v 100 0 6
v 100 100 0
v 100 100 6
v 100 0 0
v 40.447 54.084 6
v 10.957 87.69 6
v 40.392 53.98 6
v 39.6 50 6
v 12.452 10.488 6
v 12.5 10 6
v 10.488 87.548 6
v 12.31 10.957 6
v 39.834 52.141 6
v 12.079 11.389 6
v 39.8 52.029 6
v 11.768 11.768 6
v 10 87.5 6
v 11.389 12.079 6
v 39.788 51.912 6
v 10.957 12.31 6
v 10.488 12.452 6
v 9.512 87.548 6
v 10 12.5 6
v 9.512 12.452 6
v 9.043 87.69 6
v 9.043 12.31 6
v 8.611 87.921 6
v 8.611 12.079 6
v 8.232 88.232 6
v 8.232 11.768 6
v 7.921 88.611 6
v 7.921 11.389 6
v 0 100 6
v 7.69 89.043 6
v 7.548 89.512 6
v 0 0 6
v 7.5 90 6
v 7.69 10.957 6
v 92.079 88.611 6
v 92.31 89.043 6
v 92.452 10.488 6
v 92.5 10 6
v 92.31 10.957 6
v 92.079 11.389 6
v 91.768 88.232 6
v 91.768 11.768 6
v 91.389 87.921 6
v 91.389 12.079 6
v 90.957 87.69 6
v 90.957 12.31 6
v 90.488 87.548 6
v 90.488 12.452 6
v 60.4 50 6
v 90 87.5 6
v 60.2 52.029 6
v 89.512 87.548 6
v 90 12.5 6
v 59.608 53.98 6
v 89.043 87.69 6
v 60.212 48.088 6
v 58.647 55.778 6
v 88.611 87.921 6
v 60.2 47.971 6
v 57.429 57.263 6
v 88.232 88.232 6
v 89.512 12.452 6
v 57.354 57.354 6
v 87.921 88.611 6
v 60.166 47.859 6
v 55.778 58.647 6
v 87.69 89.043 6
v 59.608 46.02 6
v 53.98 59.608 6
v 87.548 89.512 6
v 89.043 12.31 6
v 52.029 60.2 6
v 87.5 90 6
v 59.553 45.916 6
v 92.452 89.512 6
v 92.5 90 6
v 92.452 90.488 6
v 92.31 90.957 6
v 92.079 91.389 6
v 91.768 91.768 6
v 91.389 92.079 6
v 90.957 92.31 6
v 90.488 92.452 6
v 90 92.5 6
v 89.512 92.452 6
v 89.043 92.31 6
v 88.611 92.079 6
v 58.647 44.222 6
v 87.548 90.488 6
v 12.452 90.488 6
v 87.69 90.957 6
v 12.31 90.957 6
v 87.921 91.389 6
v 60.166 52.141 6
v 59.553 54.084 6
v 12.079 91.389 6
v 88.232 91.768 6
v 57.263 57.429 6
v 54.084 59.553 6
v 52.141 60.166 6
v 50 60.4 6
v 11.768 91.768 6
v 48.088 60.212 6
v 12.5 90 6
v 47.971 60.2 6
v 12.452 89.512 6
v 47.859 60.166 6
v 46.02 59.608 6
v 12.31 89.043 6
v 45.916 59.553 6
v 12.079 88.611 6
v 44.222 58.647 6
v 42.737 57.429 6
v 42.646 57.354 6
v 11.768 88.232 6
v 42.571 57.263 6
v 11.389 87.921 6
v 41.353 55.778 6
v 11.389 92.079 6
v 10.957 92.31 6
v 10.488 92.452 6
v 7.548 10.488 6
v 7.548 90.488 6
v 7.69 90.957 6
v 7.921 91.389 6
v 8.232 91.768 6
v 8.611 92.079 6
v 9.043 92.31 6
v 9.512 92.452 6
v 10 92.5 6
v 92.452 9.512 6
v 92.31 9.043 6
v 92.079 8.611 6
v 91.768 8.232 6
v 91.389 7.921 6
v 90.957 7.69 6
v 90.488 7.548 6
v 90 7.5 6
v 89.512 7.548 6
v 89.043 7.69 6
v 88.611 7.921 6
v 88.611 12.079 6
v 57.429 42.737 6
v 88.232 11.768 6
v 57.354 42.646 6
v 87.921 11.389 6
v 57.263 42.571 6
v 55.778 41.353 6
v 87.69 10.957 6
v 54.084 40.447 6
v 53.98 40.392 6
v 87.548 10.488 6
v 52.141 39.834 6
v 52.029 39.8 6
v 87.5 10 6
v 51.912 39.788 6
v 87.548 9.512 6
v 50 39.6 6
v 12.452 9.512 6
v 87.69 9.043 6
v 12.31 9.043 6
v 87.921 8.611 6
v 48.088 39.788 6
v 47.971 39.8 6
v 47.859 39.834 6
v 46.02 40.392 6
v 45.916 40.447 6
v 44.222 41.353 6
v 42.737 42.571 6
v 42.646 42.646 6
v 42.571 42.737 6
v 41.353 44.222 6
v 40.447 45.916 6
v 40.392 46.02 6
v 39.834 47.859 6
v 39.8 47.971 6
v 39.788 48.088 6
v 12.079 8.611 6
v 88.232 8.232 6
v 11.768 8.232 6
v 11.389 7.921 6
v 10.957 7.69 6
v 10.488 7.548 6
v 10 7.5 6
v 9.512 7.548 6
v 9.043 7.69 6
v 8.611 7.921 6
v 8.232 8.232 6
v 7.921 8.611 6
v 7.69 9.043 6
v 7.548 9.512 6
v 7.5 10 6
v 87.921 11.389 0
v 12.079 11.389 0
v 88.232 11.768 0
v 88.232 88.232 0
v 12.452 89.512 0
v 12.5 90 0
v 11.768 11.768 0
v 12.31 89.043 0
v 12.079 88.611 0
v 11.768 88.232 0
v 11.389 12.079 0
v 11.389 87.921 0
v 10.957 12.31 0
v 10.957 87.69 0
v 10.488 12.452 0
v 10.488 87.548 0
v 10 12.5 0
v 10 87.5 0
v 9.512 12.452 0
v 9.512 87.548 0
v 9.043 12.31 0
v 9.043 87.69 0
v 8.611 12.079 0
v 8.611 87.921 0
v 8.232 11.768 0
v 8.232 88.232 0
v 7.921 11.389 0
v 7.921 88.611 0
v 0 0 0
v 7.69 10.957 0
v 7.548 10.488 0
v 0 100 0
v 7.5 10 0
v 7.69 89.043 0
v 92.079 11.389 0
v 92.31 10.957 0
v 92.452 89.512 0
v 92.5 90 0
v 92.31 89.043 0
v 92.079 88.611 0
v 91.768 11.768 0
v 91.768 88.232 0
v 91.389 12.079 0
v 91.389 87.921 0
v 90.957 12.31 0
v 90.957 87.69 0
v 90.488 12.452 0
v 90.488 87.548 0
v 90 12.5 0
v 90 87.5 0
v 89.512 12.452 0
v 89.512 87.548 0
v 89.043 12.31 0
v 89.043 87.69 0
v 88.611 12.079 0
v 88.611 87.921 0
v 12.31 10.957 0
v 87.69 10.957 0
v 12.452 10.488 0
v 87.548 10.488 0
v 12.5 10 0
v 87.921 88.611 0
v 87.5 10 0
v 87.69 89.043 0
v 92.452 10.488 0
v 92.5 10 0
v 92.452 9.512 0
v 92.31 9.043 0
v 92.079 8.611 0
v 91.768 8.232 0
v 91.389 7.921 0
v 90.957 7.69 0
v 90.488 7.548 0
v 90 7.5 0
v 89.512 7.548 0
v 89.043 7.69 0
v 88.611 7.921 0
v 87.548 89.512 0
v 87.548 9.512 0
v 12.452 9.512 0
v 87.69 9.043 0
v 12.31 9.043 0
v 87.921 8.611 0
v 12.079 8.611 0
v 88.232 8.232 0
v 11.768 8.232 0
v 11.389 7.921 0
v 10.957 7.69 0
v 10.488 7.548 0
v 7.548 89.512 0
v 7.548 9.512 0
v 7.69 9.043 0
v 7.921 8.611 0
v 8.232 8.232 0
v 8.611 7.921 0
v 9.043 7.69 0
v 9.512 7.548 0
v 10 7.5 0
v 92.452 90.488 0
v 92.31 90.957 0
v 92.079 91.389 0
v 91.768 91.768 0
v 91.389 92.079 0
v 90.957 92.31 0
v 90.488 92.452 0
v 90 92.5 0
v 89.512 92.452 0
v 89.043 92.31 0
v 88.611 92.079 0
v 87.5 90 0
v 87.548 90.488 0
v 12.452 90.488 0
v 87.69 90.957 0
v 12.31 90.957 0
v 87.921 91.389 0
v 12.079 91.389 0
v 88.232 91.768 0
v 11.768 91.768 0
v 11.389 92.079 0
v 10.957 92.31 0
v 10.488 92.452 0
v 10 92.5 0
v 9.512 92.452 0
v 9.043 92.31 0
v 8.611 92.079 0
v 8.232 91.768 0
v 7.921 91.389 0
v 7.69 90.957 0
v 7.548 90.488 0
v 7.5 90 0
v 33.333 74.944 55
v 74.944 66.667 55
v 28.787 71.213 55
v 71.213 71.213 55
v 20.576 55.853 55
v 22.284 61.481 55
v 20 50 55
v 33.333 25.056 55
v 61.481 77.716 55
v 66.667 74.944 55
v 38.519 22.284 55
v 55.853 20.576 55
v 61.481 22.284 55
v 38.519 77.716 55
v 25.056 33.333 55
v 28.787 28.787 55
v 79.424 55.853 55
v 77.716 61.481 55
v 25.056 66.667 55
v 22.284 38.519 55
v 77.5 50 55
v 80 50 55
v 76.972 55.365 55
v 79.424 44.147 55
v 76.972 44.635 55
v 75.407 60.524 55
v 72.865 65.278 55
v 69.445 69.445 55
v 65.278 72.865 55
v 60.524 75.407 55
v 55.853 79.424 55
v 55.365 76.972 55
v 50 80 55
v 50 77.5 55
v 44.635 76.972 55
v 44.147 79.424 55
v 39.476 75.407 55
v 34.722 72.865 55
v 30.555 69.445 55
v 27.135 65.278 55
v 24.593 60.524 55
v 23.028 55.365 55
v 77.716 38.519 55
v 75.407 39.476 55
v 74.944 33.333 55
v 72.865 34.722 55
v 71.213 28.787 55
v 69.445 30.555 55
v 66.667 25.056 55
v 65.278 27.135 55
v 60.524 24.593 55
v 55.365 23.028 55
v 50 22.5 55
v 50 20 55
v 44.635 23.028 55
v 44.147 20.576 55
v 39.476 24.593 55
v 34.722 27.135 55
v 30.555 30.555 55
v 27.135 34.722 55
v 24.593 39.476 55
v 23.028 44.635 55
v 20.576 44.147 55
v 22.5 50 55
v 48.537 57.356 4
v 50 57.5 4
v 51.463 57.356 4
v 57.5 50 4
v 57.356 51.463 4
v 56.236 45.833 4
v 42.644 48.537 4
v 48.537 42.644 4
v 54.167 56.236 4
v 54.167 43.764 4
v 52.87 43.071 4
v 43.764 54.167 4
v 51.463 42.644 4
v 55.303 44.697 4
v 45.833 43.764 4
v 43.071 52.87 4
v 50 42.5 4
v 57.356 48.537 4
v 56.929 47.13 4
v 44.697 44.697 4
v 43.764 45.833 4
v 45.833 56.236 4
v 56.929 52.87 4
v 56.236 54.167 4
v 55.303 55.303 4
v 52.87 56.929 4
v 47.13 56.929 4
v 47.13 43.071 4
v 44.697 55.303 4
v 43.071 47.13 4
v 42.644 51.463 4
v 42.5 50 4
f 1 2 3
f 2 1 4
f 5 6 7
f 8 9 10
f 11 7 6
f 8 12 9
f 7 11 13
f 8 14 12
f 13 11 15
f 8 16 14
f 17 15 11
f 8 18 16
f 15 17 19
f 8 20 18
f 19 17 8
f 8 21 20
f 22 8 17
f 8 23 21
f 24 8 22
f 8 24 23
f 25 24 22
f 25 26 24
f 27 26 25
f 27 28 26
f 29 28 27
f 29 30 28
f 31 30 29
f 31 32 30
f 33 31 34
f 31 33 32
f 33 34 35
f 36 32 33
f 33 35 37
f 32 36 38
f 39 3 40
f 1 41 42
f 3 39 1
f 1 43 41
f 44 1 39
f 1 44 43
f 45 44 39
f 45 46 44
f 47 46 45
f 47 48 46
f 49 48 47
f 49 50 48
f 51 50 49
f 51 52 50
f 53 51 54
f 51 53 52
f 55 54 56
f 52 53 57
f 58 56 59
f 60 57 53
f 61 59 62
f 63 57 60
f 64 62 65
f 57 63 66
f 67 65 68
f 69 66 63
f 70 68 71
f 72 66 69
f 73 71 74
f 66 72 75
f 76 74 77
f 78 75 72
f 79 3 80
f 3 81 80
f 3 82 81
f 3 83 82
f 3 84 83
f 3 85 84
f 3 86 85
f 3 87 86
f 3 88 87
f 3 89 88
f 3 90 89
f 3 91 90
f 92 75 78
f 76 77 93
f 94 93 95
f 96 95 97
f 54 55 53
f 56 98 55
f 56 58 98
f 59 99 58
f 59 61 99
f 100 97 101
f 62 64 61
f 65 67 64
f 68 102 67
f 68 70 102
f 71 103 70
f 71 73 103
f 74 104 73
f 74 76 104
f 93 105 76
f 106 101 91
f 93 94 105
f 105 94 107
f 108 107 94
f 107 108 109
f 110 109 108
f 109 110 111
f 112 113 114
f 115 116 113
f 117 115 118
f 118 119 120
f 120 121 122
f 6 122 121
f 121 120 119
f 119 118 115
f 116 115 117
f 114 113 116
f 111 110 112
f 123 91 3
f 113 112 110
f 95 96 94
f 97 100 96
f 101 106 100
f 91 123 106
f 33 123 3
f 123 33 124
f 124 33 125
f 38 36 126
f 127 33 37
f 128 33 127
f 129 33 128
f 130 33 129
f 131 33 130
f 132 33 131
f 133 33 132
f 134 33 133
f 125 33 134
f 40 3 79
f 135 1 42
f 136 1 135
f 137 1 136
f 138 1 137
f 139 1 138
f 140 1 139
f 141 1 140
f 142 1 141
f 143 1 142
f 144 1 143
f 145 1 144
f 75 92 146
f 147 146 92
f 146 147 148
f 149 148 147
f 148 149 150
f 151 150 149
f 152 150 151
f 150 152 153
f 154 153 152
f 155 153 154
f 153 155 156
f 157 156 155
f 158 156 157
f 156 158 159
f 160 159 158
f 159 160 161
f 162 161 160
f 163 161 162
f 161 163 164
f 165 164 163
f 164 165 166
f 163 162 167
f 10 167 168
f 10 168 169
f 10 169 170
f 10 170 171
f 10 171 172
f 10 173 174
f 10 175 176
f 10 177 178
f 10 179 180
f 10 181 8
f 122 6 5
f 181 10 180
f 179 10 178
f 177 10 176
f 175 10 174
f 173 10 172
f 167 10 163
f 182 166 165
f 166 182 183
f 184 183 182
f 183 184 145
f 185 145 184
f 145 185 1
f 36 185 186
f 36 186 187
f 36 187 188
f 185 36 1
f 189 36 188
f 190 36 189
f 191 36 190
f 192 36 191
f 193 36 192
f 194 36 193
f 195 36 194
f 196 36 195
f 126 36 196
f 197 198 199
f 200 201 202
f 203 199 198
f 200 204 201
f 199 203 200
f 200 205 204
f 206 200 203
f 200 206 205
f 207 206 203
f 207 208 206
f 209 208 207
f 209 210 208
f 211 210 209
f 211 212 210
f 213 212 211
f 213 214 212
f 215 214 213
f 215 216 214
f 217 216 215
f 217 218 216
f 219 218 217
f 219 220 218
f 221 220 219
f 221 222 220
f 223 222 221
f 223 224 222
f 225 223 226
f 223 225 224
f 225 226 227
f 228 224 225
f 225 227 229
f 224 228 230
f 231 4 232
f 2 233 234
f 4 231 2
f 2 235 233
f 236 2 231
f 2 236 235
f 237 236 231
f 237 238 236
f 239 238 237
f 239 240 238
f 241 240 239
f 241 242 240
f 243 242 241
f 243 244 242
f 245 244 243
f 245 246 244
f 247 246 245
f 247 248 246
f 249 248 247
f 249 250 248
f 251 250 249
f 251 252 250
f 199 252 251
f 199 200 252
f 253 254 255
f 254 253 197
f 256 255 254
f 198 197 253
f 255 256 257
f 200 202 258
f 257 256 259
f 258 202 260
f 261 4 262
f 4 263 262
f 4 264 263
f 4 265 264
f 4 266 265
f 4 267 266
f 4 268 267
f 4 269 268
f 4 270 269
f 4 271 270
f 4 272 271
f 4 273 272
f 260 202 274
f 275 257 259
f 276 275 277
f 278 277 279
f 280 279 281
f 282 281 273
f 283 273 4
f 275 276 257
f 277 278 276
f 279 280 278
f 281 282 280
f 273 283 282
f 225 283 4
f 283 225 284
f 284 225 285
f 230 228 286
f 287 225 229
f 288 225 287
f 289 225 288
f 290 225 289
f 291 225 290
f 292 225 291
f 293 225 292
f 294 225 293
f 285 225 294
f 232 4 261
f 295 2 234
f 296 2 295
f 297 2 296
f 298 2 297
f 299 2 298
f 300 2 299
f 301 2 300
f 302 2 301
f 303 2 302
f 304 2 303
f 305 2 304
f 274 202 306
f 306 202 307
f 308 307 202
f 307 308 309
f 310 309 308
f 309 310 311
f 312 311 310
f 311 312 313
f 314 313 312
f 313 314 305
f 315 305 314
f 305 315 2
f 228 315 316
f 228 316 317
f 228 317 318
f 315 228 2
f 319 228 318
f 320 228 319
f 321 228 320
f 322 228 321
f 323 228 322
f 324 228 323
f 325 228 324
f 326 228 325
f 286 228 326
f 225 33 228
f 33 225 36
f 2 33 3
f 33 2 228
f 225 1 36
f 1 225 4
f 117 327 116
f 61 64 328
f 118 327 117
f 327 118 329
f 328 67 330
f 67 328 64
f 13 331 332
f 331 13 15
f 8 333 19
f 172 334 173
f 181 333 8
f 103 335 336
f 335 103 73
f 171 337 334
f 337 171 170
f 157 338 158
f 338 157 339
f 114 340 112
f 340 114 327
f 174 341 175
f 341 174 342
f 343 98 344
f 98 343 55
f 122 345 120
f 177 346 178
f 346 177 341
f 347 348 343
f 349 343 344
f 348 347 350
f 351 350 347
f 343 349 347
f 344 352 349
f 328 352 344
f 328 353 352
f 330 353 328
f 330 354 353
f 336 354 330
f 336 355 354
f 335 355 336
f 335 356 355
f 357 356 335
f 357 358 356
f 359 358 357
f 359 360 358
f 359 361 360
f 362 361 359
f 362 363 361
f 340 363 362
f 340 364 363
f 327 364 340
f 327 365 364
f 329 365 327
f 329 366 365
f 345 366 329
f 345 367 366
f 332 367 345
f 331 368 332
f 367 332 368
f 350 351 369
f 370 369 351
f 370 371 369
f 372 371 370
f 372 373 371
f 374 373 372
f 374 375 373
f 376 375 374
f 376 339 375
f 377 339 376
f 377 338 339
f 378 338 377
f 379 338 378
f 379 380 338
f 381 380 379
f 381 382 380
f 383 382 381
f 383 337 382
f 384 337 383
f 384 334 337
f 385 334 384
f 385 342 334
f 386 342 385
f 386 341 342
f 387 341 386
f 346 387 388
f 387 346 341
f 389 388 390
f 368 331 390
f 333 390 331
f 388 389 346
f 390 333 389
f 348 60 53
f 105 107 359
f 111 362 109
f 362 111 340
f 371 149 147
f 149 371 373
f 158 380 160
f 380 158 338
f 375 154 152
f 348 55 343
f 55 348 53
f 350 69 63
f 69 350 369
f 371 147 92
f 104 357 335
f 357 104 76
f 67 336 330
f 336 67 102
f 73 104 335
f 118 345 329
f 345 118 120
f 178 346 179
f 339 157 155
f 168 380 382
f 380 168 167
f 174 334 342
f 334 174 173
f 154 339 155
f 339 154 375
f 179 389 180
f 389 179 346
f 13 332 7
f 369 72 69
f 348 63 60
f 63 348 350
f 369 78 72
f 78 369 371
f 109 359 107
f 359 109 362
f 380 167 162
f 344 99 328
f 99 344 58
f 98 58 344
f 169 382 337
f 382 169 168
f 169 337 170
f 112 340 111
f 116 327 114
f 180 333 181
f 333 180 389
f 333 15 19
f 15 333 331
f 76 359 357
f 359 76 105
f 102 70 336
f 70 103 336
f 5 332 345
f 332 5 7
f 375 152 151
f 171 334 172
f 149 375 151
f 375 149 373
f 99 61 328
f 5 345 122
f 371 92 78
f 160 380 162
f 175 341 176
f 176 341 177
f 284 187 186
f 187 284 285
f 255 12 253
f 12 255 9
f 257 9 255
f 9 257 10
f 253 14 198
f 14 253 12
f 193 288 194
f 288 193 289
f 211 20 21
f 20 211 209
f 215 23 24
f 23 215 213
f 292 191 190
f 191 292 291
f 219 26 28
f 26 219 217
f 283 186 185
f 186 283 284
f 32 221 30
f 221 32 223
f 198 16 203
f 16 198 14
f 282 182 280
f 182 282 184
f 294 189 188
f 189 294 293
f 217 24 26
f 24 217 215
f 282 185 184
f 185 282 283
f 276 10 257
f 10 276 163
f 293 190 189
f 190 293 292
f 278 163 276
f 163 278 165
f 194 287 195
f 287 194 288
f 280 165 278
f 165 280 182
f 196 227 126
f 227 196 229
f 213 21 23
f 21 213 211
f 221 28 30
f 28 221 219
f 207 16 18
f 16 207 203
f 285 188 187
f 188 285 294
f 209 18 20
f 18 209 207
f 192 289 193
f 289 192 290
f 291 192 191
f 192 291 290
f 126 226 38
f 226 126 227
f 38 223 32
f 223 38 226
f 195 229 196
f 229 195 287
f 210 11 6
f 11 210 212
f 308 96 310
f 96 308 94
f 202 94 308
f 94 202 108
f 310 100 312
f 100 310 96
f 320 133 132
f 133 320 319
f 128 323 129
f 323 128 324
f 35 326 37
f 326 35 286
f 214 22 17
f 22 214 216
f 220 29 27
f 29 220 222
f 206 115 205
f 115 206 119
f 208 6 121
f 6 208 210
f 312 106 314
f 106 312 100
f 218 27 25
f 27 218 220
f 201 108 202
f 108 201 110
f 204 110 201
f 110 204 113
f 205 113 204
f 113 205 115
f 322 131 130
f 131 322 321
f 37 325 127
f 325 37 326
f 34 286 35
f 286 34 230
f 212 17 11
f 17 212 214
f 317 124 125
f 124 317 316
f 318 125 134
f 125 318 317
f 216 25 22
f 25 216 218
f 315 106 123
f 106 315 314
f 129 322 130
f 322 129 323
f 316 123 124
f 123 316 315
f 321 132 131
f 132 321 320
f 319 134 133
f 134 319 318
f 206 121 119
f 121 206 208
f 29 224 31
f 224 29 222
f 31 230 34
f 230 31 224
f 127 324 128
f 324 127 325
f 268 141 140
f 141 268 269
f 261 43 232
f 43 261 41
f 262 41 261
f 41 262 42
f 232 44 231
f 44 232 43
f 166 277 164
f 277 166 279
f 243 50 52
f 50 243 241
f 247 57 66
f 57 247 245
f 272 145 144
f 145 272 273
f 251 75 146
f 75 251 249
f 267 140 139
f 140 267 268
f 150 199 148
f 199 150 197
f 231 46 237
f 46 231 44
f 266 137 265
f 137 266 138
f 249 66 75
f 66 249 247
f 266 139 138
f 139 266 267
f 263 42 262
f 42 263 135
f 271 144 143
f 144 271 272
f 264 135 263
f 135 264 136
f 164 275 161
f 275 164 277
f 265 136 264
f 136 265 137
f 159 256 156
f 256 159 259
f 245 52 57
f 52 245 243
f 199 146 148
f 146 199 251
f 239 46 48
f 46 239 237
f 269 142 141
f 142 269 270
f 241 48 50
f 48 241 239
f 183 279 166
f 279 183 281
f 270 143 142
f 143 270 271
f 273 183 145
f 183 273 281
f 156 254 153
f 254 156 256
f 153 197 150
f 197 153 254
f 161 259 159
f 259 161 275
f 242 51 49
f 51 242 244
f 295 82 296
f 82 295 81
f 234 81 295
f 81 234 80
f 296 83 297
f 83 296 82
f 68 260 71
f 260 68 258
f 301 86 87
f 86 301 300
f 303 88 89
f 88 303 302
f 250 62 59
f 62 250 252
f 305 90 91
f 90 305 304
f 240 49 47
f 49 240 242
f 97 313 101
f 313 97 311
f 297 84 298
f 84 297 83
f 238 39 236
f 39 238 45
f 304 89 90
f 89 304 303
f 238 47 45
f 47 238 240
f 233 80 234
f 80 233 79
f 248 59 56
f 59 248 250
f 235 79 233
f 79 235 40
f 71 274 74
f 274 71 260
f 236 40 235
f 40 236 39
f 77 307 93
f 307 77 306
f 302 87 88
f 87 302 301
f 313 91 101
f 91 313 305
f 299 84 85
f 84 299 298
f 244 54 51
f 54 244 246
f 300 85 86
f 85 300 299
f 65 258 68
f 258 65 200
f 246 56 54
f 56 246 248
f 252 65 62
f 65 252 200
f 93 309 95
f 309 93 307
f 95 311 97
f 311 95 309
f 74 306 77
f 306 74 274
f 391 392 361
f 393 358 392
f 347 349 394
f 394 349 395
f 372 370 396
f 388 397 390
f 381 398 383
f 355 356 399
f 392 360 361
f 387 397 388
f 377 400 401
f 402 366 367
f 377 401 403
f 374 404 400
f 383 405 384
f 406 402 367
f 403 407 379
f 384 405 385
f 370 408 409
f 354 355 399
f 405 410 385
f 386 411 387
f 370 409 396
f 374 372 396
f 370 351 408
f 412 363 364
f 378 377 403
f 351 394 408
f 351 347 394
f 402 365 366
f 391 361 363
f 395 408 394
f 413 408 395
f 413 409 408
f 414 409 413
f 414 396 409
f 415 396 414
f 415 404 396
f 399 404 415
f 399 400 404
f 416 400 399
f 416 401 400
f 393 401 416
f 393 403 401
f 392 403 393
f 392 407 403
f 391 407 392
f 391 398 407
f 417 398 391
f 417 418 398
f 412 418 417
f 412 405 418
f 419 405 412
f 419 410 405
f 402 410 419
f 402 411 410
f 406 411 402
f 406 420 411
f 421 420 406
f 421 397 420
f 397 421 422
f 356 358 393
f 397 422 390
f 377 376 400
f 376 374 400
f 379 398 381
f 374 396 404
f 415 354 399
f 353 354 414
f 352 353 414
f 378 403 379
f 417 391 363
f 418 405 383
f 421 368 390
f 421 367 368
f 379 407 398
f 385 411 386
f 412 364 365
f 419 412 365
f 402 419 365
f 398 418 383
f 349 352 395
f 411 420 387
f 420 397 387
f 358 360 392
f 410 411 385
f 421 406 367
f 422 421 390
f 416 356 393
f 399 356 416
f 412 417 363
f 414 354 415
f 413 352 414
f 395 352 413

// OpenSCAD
$fn = 32;

// ----------------------------------------------------------------------
// Hopper: flanged with square flange
// ----------------------------------------------------------------------

// --- parameters (mm) ---
fl = 100;                 // flange side, X and Y
fl_t = 6;                 // flange thickness
cone_h = 50;              // cone height above the flange
top_d = 60;               // cone mouth diameter
bot_d = 20;               // cone spout diameter
wall = 2.5;               // cone wall thickness
hole_r = 2.5;             // flange hole radius
hole_in = 10;             // hole inset from the corners

bore_d = bot_d - 2 * wall;  // spout bore diameter
total_h = fl_t + cone_h - 1;  // overall height

difference() {
  union() {
    cube([fl, fl, fl_t]);
    translate([fl / 2, fl / 2, fl_t - 1])
      cylinder(h = cone_h, d1 = bot_d, d2 = top_d);
  }
  translate([fl / 2, fl / 2, fl_t - 2])
    cylinder(h = cone_h + 1, d1 = bore_d, d2 = top_d - 2 * wall);
  for (sx = [0, 1], sy = [0, 1])
    translate([sx ? fl - hole_in : hole_in,
               sy ? fl - hole_in : hole_in, -1])
      cylinder(r = hole_r, h = fl_t + 2);
}
